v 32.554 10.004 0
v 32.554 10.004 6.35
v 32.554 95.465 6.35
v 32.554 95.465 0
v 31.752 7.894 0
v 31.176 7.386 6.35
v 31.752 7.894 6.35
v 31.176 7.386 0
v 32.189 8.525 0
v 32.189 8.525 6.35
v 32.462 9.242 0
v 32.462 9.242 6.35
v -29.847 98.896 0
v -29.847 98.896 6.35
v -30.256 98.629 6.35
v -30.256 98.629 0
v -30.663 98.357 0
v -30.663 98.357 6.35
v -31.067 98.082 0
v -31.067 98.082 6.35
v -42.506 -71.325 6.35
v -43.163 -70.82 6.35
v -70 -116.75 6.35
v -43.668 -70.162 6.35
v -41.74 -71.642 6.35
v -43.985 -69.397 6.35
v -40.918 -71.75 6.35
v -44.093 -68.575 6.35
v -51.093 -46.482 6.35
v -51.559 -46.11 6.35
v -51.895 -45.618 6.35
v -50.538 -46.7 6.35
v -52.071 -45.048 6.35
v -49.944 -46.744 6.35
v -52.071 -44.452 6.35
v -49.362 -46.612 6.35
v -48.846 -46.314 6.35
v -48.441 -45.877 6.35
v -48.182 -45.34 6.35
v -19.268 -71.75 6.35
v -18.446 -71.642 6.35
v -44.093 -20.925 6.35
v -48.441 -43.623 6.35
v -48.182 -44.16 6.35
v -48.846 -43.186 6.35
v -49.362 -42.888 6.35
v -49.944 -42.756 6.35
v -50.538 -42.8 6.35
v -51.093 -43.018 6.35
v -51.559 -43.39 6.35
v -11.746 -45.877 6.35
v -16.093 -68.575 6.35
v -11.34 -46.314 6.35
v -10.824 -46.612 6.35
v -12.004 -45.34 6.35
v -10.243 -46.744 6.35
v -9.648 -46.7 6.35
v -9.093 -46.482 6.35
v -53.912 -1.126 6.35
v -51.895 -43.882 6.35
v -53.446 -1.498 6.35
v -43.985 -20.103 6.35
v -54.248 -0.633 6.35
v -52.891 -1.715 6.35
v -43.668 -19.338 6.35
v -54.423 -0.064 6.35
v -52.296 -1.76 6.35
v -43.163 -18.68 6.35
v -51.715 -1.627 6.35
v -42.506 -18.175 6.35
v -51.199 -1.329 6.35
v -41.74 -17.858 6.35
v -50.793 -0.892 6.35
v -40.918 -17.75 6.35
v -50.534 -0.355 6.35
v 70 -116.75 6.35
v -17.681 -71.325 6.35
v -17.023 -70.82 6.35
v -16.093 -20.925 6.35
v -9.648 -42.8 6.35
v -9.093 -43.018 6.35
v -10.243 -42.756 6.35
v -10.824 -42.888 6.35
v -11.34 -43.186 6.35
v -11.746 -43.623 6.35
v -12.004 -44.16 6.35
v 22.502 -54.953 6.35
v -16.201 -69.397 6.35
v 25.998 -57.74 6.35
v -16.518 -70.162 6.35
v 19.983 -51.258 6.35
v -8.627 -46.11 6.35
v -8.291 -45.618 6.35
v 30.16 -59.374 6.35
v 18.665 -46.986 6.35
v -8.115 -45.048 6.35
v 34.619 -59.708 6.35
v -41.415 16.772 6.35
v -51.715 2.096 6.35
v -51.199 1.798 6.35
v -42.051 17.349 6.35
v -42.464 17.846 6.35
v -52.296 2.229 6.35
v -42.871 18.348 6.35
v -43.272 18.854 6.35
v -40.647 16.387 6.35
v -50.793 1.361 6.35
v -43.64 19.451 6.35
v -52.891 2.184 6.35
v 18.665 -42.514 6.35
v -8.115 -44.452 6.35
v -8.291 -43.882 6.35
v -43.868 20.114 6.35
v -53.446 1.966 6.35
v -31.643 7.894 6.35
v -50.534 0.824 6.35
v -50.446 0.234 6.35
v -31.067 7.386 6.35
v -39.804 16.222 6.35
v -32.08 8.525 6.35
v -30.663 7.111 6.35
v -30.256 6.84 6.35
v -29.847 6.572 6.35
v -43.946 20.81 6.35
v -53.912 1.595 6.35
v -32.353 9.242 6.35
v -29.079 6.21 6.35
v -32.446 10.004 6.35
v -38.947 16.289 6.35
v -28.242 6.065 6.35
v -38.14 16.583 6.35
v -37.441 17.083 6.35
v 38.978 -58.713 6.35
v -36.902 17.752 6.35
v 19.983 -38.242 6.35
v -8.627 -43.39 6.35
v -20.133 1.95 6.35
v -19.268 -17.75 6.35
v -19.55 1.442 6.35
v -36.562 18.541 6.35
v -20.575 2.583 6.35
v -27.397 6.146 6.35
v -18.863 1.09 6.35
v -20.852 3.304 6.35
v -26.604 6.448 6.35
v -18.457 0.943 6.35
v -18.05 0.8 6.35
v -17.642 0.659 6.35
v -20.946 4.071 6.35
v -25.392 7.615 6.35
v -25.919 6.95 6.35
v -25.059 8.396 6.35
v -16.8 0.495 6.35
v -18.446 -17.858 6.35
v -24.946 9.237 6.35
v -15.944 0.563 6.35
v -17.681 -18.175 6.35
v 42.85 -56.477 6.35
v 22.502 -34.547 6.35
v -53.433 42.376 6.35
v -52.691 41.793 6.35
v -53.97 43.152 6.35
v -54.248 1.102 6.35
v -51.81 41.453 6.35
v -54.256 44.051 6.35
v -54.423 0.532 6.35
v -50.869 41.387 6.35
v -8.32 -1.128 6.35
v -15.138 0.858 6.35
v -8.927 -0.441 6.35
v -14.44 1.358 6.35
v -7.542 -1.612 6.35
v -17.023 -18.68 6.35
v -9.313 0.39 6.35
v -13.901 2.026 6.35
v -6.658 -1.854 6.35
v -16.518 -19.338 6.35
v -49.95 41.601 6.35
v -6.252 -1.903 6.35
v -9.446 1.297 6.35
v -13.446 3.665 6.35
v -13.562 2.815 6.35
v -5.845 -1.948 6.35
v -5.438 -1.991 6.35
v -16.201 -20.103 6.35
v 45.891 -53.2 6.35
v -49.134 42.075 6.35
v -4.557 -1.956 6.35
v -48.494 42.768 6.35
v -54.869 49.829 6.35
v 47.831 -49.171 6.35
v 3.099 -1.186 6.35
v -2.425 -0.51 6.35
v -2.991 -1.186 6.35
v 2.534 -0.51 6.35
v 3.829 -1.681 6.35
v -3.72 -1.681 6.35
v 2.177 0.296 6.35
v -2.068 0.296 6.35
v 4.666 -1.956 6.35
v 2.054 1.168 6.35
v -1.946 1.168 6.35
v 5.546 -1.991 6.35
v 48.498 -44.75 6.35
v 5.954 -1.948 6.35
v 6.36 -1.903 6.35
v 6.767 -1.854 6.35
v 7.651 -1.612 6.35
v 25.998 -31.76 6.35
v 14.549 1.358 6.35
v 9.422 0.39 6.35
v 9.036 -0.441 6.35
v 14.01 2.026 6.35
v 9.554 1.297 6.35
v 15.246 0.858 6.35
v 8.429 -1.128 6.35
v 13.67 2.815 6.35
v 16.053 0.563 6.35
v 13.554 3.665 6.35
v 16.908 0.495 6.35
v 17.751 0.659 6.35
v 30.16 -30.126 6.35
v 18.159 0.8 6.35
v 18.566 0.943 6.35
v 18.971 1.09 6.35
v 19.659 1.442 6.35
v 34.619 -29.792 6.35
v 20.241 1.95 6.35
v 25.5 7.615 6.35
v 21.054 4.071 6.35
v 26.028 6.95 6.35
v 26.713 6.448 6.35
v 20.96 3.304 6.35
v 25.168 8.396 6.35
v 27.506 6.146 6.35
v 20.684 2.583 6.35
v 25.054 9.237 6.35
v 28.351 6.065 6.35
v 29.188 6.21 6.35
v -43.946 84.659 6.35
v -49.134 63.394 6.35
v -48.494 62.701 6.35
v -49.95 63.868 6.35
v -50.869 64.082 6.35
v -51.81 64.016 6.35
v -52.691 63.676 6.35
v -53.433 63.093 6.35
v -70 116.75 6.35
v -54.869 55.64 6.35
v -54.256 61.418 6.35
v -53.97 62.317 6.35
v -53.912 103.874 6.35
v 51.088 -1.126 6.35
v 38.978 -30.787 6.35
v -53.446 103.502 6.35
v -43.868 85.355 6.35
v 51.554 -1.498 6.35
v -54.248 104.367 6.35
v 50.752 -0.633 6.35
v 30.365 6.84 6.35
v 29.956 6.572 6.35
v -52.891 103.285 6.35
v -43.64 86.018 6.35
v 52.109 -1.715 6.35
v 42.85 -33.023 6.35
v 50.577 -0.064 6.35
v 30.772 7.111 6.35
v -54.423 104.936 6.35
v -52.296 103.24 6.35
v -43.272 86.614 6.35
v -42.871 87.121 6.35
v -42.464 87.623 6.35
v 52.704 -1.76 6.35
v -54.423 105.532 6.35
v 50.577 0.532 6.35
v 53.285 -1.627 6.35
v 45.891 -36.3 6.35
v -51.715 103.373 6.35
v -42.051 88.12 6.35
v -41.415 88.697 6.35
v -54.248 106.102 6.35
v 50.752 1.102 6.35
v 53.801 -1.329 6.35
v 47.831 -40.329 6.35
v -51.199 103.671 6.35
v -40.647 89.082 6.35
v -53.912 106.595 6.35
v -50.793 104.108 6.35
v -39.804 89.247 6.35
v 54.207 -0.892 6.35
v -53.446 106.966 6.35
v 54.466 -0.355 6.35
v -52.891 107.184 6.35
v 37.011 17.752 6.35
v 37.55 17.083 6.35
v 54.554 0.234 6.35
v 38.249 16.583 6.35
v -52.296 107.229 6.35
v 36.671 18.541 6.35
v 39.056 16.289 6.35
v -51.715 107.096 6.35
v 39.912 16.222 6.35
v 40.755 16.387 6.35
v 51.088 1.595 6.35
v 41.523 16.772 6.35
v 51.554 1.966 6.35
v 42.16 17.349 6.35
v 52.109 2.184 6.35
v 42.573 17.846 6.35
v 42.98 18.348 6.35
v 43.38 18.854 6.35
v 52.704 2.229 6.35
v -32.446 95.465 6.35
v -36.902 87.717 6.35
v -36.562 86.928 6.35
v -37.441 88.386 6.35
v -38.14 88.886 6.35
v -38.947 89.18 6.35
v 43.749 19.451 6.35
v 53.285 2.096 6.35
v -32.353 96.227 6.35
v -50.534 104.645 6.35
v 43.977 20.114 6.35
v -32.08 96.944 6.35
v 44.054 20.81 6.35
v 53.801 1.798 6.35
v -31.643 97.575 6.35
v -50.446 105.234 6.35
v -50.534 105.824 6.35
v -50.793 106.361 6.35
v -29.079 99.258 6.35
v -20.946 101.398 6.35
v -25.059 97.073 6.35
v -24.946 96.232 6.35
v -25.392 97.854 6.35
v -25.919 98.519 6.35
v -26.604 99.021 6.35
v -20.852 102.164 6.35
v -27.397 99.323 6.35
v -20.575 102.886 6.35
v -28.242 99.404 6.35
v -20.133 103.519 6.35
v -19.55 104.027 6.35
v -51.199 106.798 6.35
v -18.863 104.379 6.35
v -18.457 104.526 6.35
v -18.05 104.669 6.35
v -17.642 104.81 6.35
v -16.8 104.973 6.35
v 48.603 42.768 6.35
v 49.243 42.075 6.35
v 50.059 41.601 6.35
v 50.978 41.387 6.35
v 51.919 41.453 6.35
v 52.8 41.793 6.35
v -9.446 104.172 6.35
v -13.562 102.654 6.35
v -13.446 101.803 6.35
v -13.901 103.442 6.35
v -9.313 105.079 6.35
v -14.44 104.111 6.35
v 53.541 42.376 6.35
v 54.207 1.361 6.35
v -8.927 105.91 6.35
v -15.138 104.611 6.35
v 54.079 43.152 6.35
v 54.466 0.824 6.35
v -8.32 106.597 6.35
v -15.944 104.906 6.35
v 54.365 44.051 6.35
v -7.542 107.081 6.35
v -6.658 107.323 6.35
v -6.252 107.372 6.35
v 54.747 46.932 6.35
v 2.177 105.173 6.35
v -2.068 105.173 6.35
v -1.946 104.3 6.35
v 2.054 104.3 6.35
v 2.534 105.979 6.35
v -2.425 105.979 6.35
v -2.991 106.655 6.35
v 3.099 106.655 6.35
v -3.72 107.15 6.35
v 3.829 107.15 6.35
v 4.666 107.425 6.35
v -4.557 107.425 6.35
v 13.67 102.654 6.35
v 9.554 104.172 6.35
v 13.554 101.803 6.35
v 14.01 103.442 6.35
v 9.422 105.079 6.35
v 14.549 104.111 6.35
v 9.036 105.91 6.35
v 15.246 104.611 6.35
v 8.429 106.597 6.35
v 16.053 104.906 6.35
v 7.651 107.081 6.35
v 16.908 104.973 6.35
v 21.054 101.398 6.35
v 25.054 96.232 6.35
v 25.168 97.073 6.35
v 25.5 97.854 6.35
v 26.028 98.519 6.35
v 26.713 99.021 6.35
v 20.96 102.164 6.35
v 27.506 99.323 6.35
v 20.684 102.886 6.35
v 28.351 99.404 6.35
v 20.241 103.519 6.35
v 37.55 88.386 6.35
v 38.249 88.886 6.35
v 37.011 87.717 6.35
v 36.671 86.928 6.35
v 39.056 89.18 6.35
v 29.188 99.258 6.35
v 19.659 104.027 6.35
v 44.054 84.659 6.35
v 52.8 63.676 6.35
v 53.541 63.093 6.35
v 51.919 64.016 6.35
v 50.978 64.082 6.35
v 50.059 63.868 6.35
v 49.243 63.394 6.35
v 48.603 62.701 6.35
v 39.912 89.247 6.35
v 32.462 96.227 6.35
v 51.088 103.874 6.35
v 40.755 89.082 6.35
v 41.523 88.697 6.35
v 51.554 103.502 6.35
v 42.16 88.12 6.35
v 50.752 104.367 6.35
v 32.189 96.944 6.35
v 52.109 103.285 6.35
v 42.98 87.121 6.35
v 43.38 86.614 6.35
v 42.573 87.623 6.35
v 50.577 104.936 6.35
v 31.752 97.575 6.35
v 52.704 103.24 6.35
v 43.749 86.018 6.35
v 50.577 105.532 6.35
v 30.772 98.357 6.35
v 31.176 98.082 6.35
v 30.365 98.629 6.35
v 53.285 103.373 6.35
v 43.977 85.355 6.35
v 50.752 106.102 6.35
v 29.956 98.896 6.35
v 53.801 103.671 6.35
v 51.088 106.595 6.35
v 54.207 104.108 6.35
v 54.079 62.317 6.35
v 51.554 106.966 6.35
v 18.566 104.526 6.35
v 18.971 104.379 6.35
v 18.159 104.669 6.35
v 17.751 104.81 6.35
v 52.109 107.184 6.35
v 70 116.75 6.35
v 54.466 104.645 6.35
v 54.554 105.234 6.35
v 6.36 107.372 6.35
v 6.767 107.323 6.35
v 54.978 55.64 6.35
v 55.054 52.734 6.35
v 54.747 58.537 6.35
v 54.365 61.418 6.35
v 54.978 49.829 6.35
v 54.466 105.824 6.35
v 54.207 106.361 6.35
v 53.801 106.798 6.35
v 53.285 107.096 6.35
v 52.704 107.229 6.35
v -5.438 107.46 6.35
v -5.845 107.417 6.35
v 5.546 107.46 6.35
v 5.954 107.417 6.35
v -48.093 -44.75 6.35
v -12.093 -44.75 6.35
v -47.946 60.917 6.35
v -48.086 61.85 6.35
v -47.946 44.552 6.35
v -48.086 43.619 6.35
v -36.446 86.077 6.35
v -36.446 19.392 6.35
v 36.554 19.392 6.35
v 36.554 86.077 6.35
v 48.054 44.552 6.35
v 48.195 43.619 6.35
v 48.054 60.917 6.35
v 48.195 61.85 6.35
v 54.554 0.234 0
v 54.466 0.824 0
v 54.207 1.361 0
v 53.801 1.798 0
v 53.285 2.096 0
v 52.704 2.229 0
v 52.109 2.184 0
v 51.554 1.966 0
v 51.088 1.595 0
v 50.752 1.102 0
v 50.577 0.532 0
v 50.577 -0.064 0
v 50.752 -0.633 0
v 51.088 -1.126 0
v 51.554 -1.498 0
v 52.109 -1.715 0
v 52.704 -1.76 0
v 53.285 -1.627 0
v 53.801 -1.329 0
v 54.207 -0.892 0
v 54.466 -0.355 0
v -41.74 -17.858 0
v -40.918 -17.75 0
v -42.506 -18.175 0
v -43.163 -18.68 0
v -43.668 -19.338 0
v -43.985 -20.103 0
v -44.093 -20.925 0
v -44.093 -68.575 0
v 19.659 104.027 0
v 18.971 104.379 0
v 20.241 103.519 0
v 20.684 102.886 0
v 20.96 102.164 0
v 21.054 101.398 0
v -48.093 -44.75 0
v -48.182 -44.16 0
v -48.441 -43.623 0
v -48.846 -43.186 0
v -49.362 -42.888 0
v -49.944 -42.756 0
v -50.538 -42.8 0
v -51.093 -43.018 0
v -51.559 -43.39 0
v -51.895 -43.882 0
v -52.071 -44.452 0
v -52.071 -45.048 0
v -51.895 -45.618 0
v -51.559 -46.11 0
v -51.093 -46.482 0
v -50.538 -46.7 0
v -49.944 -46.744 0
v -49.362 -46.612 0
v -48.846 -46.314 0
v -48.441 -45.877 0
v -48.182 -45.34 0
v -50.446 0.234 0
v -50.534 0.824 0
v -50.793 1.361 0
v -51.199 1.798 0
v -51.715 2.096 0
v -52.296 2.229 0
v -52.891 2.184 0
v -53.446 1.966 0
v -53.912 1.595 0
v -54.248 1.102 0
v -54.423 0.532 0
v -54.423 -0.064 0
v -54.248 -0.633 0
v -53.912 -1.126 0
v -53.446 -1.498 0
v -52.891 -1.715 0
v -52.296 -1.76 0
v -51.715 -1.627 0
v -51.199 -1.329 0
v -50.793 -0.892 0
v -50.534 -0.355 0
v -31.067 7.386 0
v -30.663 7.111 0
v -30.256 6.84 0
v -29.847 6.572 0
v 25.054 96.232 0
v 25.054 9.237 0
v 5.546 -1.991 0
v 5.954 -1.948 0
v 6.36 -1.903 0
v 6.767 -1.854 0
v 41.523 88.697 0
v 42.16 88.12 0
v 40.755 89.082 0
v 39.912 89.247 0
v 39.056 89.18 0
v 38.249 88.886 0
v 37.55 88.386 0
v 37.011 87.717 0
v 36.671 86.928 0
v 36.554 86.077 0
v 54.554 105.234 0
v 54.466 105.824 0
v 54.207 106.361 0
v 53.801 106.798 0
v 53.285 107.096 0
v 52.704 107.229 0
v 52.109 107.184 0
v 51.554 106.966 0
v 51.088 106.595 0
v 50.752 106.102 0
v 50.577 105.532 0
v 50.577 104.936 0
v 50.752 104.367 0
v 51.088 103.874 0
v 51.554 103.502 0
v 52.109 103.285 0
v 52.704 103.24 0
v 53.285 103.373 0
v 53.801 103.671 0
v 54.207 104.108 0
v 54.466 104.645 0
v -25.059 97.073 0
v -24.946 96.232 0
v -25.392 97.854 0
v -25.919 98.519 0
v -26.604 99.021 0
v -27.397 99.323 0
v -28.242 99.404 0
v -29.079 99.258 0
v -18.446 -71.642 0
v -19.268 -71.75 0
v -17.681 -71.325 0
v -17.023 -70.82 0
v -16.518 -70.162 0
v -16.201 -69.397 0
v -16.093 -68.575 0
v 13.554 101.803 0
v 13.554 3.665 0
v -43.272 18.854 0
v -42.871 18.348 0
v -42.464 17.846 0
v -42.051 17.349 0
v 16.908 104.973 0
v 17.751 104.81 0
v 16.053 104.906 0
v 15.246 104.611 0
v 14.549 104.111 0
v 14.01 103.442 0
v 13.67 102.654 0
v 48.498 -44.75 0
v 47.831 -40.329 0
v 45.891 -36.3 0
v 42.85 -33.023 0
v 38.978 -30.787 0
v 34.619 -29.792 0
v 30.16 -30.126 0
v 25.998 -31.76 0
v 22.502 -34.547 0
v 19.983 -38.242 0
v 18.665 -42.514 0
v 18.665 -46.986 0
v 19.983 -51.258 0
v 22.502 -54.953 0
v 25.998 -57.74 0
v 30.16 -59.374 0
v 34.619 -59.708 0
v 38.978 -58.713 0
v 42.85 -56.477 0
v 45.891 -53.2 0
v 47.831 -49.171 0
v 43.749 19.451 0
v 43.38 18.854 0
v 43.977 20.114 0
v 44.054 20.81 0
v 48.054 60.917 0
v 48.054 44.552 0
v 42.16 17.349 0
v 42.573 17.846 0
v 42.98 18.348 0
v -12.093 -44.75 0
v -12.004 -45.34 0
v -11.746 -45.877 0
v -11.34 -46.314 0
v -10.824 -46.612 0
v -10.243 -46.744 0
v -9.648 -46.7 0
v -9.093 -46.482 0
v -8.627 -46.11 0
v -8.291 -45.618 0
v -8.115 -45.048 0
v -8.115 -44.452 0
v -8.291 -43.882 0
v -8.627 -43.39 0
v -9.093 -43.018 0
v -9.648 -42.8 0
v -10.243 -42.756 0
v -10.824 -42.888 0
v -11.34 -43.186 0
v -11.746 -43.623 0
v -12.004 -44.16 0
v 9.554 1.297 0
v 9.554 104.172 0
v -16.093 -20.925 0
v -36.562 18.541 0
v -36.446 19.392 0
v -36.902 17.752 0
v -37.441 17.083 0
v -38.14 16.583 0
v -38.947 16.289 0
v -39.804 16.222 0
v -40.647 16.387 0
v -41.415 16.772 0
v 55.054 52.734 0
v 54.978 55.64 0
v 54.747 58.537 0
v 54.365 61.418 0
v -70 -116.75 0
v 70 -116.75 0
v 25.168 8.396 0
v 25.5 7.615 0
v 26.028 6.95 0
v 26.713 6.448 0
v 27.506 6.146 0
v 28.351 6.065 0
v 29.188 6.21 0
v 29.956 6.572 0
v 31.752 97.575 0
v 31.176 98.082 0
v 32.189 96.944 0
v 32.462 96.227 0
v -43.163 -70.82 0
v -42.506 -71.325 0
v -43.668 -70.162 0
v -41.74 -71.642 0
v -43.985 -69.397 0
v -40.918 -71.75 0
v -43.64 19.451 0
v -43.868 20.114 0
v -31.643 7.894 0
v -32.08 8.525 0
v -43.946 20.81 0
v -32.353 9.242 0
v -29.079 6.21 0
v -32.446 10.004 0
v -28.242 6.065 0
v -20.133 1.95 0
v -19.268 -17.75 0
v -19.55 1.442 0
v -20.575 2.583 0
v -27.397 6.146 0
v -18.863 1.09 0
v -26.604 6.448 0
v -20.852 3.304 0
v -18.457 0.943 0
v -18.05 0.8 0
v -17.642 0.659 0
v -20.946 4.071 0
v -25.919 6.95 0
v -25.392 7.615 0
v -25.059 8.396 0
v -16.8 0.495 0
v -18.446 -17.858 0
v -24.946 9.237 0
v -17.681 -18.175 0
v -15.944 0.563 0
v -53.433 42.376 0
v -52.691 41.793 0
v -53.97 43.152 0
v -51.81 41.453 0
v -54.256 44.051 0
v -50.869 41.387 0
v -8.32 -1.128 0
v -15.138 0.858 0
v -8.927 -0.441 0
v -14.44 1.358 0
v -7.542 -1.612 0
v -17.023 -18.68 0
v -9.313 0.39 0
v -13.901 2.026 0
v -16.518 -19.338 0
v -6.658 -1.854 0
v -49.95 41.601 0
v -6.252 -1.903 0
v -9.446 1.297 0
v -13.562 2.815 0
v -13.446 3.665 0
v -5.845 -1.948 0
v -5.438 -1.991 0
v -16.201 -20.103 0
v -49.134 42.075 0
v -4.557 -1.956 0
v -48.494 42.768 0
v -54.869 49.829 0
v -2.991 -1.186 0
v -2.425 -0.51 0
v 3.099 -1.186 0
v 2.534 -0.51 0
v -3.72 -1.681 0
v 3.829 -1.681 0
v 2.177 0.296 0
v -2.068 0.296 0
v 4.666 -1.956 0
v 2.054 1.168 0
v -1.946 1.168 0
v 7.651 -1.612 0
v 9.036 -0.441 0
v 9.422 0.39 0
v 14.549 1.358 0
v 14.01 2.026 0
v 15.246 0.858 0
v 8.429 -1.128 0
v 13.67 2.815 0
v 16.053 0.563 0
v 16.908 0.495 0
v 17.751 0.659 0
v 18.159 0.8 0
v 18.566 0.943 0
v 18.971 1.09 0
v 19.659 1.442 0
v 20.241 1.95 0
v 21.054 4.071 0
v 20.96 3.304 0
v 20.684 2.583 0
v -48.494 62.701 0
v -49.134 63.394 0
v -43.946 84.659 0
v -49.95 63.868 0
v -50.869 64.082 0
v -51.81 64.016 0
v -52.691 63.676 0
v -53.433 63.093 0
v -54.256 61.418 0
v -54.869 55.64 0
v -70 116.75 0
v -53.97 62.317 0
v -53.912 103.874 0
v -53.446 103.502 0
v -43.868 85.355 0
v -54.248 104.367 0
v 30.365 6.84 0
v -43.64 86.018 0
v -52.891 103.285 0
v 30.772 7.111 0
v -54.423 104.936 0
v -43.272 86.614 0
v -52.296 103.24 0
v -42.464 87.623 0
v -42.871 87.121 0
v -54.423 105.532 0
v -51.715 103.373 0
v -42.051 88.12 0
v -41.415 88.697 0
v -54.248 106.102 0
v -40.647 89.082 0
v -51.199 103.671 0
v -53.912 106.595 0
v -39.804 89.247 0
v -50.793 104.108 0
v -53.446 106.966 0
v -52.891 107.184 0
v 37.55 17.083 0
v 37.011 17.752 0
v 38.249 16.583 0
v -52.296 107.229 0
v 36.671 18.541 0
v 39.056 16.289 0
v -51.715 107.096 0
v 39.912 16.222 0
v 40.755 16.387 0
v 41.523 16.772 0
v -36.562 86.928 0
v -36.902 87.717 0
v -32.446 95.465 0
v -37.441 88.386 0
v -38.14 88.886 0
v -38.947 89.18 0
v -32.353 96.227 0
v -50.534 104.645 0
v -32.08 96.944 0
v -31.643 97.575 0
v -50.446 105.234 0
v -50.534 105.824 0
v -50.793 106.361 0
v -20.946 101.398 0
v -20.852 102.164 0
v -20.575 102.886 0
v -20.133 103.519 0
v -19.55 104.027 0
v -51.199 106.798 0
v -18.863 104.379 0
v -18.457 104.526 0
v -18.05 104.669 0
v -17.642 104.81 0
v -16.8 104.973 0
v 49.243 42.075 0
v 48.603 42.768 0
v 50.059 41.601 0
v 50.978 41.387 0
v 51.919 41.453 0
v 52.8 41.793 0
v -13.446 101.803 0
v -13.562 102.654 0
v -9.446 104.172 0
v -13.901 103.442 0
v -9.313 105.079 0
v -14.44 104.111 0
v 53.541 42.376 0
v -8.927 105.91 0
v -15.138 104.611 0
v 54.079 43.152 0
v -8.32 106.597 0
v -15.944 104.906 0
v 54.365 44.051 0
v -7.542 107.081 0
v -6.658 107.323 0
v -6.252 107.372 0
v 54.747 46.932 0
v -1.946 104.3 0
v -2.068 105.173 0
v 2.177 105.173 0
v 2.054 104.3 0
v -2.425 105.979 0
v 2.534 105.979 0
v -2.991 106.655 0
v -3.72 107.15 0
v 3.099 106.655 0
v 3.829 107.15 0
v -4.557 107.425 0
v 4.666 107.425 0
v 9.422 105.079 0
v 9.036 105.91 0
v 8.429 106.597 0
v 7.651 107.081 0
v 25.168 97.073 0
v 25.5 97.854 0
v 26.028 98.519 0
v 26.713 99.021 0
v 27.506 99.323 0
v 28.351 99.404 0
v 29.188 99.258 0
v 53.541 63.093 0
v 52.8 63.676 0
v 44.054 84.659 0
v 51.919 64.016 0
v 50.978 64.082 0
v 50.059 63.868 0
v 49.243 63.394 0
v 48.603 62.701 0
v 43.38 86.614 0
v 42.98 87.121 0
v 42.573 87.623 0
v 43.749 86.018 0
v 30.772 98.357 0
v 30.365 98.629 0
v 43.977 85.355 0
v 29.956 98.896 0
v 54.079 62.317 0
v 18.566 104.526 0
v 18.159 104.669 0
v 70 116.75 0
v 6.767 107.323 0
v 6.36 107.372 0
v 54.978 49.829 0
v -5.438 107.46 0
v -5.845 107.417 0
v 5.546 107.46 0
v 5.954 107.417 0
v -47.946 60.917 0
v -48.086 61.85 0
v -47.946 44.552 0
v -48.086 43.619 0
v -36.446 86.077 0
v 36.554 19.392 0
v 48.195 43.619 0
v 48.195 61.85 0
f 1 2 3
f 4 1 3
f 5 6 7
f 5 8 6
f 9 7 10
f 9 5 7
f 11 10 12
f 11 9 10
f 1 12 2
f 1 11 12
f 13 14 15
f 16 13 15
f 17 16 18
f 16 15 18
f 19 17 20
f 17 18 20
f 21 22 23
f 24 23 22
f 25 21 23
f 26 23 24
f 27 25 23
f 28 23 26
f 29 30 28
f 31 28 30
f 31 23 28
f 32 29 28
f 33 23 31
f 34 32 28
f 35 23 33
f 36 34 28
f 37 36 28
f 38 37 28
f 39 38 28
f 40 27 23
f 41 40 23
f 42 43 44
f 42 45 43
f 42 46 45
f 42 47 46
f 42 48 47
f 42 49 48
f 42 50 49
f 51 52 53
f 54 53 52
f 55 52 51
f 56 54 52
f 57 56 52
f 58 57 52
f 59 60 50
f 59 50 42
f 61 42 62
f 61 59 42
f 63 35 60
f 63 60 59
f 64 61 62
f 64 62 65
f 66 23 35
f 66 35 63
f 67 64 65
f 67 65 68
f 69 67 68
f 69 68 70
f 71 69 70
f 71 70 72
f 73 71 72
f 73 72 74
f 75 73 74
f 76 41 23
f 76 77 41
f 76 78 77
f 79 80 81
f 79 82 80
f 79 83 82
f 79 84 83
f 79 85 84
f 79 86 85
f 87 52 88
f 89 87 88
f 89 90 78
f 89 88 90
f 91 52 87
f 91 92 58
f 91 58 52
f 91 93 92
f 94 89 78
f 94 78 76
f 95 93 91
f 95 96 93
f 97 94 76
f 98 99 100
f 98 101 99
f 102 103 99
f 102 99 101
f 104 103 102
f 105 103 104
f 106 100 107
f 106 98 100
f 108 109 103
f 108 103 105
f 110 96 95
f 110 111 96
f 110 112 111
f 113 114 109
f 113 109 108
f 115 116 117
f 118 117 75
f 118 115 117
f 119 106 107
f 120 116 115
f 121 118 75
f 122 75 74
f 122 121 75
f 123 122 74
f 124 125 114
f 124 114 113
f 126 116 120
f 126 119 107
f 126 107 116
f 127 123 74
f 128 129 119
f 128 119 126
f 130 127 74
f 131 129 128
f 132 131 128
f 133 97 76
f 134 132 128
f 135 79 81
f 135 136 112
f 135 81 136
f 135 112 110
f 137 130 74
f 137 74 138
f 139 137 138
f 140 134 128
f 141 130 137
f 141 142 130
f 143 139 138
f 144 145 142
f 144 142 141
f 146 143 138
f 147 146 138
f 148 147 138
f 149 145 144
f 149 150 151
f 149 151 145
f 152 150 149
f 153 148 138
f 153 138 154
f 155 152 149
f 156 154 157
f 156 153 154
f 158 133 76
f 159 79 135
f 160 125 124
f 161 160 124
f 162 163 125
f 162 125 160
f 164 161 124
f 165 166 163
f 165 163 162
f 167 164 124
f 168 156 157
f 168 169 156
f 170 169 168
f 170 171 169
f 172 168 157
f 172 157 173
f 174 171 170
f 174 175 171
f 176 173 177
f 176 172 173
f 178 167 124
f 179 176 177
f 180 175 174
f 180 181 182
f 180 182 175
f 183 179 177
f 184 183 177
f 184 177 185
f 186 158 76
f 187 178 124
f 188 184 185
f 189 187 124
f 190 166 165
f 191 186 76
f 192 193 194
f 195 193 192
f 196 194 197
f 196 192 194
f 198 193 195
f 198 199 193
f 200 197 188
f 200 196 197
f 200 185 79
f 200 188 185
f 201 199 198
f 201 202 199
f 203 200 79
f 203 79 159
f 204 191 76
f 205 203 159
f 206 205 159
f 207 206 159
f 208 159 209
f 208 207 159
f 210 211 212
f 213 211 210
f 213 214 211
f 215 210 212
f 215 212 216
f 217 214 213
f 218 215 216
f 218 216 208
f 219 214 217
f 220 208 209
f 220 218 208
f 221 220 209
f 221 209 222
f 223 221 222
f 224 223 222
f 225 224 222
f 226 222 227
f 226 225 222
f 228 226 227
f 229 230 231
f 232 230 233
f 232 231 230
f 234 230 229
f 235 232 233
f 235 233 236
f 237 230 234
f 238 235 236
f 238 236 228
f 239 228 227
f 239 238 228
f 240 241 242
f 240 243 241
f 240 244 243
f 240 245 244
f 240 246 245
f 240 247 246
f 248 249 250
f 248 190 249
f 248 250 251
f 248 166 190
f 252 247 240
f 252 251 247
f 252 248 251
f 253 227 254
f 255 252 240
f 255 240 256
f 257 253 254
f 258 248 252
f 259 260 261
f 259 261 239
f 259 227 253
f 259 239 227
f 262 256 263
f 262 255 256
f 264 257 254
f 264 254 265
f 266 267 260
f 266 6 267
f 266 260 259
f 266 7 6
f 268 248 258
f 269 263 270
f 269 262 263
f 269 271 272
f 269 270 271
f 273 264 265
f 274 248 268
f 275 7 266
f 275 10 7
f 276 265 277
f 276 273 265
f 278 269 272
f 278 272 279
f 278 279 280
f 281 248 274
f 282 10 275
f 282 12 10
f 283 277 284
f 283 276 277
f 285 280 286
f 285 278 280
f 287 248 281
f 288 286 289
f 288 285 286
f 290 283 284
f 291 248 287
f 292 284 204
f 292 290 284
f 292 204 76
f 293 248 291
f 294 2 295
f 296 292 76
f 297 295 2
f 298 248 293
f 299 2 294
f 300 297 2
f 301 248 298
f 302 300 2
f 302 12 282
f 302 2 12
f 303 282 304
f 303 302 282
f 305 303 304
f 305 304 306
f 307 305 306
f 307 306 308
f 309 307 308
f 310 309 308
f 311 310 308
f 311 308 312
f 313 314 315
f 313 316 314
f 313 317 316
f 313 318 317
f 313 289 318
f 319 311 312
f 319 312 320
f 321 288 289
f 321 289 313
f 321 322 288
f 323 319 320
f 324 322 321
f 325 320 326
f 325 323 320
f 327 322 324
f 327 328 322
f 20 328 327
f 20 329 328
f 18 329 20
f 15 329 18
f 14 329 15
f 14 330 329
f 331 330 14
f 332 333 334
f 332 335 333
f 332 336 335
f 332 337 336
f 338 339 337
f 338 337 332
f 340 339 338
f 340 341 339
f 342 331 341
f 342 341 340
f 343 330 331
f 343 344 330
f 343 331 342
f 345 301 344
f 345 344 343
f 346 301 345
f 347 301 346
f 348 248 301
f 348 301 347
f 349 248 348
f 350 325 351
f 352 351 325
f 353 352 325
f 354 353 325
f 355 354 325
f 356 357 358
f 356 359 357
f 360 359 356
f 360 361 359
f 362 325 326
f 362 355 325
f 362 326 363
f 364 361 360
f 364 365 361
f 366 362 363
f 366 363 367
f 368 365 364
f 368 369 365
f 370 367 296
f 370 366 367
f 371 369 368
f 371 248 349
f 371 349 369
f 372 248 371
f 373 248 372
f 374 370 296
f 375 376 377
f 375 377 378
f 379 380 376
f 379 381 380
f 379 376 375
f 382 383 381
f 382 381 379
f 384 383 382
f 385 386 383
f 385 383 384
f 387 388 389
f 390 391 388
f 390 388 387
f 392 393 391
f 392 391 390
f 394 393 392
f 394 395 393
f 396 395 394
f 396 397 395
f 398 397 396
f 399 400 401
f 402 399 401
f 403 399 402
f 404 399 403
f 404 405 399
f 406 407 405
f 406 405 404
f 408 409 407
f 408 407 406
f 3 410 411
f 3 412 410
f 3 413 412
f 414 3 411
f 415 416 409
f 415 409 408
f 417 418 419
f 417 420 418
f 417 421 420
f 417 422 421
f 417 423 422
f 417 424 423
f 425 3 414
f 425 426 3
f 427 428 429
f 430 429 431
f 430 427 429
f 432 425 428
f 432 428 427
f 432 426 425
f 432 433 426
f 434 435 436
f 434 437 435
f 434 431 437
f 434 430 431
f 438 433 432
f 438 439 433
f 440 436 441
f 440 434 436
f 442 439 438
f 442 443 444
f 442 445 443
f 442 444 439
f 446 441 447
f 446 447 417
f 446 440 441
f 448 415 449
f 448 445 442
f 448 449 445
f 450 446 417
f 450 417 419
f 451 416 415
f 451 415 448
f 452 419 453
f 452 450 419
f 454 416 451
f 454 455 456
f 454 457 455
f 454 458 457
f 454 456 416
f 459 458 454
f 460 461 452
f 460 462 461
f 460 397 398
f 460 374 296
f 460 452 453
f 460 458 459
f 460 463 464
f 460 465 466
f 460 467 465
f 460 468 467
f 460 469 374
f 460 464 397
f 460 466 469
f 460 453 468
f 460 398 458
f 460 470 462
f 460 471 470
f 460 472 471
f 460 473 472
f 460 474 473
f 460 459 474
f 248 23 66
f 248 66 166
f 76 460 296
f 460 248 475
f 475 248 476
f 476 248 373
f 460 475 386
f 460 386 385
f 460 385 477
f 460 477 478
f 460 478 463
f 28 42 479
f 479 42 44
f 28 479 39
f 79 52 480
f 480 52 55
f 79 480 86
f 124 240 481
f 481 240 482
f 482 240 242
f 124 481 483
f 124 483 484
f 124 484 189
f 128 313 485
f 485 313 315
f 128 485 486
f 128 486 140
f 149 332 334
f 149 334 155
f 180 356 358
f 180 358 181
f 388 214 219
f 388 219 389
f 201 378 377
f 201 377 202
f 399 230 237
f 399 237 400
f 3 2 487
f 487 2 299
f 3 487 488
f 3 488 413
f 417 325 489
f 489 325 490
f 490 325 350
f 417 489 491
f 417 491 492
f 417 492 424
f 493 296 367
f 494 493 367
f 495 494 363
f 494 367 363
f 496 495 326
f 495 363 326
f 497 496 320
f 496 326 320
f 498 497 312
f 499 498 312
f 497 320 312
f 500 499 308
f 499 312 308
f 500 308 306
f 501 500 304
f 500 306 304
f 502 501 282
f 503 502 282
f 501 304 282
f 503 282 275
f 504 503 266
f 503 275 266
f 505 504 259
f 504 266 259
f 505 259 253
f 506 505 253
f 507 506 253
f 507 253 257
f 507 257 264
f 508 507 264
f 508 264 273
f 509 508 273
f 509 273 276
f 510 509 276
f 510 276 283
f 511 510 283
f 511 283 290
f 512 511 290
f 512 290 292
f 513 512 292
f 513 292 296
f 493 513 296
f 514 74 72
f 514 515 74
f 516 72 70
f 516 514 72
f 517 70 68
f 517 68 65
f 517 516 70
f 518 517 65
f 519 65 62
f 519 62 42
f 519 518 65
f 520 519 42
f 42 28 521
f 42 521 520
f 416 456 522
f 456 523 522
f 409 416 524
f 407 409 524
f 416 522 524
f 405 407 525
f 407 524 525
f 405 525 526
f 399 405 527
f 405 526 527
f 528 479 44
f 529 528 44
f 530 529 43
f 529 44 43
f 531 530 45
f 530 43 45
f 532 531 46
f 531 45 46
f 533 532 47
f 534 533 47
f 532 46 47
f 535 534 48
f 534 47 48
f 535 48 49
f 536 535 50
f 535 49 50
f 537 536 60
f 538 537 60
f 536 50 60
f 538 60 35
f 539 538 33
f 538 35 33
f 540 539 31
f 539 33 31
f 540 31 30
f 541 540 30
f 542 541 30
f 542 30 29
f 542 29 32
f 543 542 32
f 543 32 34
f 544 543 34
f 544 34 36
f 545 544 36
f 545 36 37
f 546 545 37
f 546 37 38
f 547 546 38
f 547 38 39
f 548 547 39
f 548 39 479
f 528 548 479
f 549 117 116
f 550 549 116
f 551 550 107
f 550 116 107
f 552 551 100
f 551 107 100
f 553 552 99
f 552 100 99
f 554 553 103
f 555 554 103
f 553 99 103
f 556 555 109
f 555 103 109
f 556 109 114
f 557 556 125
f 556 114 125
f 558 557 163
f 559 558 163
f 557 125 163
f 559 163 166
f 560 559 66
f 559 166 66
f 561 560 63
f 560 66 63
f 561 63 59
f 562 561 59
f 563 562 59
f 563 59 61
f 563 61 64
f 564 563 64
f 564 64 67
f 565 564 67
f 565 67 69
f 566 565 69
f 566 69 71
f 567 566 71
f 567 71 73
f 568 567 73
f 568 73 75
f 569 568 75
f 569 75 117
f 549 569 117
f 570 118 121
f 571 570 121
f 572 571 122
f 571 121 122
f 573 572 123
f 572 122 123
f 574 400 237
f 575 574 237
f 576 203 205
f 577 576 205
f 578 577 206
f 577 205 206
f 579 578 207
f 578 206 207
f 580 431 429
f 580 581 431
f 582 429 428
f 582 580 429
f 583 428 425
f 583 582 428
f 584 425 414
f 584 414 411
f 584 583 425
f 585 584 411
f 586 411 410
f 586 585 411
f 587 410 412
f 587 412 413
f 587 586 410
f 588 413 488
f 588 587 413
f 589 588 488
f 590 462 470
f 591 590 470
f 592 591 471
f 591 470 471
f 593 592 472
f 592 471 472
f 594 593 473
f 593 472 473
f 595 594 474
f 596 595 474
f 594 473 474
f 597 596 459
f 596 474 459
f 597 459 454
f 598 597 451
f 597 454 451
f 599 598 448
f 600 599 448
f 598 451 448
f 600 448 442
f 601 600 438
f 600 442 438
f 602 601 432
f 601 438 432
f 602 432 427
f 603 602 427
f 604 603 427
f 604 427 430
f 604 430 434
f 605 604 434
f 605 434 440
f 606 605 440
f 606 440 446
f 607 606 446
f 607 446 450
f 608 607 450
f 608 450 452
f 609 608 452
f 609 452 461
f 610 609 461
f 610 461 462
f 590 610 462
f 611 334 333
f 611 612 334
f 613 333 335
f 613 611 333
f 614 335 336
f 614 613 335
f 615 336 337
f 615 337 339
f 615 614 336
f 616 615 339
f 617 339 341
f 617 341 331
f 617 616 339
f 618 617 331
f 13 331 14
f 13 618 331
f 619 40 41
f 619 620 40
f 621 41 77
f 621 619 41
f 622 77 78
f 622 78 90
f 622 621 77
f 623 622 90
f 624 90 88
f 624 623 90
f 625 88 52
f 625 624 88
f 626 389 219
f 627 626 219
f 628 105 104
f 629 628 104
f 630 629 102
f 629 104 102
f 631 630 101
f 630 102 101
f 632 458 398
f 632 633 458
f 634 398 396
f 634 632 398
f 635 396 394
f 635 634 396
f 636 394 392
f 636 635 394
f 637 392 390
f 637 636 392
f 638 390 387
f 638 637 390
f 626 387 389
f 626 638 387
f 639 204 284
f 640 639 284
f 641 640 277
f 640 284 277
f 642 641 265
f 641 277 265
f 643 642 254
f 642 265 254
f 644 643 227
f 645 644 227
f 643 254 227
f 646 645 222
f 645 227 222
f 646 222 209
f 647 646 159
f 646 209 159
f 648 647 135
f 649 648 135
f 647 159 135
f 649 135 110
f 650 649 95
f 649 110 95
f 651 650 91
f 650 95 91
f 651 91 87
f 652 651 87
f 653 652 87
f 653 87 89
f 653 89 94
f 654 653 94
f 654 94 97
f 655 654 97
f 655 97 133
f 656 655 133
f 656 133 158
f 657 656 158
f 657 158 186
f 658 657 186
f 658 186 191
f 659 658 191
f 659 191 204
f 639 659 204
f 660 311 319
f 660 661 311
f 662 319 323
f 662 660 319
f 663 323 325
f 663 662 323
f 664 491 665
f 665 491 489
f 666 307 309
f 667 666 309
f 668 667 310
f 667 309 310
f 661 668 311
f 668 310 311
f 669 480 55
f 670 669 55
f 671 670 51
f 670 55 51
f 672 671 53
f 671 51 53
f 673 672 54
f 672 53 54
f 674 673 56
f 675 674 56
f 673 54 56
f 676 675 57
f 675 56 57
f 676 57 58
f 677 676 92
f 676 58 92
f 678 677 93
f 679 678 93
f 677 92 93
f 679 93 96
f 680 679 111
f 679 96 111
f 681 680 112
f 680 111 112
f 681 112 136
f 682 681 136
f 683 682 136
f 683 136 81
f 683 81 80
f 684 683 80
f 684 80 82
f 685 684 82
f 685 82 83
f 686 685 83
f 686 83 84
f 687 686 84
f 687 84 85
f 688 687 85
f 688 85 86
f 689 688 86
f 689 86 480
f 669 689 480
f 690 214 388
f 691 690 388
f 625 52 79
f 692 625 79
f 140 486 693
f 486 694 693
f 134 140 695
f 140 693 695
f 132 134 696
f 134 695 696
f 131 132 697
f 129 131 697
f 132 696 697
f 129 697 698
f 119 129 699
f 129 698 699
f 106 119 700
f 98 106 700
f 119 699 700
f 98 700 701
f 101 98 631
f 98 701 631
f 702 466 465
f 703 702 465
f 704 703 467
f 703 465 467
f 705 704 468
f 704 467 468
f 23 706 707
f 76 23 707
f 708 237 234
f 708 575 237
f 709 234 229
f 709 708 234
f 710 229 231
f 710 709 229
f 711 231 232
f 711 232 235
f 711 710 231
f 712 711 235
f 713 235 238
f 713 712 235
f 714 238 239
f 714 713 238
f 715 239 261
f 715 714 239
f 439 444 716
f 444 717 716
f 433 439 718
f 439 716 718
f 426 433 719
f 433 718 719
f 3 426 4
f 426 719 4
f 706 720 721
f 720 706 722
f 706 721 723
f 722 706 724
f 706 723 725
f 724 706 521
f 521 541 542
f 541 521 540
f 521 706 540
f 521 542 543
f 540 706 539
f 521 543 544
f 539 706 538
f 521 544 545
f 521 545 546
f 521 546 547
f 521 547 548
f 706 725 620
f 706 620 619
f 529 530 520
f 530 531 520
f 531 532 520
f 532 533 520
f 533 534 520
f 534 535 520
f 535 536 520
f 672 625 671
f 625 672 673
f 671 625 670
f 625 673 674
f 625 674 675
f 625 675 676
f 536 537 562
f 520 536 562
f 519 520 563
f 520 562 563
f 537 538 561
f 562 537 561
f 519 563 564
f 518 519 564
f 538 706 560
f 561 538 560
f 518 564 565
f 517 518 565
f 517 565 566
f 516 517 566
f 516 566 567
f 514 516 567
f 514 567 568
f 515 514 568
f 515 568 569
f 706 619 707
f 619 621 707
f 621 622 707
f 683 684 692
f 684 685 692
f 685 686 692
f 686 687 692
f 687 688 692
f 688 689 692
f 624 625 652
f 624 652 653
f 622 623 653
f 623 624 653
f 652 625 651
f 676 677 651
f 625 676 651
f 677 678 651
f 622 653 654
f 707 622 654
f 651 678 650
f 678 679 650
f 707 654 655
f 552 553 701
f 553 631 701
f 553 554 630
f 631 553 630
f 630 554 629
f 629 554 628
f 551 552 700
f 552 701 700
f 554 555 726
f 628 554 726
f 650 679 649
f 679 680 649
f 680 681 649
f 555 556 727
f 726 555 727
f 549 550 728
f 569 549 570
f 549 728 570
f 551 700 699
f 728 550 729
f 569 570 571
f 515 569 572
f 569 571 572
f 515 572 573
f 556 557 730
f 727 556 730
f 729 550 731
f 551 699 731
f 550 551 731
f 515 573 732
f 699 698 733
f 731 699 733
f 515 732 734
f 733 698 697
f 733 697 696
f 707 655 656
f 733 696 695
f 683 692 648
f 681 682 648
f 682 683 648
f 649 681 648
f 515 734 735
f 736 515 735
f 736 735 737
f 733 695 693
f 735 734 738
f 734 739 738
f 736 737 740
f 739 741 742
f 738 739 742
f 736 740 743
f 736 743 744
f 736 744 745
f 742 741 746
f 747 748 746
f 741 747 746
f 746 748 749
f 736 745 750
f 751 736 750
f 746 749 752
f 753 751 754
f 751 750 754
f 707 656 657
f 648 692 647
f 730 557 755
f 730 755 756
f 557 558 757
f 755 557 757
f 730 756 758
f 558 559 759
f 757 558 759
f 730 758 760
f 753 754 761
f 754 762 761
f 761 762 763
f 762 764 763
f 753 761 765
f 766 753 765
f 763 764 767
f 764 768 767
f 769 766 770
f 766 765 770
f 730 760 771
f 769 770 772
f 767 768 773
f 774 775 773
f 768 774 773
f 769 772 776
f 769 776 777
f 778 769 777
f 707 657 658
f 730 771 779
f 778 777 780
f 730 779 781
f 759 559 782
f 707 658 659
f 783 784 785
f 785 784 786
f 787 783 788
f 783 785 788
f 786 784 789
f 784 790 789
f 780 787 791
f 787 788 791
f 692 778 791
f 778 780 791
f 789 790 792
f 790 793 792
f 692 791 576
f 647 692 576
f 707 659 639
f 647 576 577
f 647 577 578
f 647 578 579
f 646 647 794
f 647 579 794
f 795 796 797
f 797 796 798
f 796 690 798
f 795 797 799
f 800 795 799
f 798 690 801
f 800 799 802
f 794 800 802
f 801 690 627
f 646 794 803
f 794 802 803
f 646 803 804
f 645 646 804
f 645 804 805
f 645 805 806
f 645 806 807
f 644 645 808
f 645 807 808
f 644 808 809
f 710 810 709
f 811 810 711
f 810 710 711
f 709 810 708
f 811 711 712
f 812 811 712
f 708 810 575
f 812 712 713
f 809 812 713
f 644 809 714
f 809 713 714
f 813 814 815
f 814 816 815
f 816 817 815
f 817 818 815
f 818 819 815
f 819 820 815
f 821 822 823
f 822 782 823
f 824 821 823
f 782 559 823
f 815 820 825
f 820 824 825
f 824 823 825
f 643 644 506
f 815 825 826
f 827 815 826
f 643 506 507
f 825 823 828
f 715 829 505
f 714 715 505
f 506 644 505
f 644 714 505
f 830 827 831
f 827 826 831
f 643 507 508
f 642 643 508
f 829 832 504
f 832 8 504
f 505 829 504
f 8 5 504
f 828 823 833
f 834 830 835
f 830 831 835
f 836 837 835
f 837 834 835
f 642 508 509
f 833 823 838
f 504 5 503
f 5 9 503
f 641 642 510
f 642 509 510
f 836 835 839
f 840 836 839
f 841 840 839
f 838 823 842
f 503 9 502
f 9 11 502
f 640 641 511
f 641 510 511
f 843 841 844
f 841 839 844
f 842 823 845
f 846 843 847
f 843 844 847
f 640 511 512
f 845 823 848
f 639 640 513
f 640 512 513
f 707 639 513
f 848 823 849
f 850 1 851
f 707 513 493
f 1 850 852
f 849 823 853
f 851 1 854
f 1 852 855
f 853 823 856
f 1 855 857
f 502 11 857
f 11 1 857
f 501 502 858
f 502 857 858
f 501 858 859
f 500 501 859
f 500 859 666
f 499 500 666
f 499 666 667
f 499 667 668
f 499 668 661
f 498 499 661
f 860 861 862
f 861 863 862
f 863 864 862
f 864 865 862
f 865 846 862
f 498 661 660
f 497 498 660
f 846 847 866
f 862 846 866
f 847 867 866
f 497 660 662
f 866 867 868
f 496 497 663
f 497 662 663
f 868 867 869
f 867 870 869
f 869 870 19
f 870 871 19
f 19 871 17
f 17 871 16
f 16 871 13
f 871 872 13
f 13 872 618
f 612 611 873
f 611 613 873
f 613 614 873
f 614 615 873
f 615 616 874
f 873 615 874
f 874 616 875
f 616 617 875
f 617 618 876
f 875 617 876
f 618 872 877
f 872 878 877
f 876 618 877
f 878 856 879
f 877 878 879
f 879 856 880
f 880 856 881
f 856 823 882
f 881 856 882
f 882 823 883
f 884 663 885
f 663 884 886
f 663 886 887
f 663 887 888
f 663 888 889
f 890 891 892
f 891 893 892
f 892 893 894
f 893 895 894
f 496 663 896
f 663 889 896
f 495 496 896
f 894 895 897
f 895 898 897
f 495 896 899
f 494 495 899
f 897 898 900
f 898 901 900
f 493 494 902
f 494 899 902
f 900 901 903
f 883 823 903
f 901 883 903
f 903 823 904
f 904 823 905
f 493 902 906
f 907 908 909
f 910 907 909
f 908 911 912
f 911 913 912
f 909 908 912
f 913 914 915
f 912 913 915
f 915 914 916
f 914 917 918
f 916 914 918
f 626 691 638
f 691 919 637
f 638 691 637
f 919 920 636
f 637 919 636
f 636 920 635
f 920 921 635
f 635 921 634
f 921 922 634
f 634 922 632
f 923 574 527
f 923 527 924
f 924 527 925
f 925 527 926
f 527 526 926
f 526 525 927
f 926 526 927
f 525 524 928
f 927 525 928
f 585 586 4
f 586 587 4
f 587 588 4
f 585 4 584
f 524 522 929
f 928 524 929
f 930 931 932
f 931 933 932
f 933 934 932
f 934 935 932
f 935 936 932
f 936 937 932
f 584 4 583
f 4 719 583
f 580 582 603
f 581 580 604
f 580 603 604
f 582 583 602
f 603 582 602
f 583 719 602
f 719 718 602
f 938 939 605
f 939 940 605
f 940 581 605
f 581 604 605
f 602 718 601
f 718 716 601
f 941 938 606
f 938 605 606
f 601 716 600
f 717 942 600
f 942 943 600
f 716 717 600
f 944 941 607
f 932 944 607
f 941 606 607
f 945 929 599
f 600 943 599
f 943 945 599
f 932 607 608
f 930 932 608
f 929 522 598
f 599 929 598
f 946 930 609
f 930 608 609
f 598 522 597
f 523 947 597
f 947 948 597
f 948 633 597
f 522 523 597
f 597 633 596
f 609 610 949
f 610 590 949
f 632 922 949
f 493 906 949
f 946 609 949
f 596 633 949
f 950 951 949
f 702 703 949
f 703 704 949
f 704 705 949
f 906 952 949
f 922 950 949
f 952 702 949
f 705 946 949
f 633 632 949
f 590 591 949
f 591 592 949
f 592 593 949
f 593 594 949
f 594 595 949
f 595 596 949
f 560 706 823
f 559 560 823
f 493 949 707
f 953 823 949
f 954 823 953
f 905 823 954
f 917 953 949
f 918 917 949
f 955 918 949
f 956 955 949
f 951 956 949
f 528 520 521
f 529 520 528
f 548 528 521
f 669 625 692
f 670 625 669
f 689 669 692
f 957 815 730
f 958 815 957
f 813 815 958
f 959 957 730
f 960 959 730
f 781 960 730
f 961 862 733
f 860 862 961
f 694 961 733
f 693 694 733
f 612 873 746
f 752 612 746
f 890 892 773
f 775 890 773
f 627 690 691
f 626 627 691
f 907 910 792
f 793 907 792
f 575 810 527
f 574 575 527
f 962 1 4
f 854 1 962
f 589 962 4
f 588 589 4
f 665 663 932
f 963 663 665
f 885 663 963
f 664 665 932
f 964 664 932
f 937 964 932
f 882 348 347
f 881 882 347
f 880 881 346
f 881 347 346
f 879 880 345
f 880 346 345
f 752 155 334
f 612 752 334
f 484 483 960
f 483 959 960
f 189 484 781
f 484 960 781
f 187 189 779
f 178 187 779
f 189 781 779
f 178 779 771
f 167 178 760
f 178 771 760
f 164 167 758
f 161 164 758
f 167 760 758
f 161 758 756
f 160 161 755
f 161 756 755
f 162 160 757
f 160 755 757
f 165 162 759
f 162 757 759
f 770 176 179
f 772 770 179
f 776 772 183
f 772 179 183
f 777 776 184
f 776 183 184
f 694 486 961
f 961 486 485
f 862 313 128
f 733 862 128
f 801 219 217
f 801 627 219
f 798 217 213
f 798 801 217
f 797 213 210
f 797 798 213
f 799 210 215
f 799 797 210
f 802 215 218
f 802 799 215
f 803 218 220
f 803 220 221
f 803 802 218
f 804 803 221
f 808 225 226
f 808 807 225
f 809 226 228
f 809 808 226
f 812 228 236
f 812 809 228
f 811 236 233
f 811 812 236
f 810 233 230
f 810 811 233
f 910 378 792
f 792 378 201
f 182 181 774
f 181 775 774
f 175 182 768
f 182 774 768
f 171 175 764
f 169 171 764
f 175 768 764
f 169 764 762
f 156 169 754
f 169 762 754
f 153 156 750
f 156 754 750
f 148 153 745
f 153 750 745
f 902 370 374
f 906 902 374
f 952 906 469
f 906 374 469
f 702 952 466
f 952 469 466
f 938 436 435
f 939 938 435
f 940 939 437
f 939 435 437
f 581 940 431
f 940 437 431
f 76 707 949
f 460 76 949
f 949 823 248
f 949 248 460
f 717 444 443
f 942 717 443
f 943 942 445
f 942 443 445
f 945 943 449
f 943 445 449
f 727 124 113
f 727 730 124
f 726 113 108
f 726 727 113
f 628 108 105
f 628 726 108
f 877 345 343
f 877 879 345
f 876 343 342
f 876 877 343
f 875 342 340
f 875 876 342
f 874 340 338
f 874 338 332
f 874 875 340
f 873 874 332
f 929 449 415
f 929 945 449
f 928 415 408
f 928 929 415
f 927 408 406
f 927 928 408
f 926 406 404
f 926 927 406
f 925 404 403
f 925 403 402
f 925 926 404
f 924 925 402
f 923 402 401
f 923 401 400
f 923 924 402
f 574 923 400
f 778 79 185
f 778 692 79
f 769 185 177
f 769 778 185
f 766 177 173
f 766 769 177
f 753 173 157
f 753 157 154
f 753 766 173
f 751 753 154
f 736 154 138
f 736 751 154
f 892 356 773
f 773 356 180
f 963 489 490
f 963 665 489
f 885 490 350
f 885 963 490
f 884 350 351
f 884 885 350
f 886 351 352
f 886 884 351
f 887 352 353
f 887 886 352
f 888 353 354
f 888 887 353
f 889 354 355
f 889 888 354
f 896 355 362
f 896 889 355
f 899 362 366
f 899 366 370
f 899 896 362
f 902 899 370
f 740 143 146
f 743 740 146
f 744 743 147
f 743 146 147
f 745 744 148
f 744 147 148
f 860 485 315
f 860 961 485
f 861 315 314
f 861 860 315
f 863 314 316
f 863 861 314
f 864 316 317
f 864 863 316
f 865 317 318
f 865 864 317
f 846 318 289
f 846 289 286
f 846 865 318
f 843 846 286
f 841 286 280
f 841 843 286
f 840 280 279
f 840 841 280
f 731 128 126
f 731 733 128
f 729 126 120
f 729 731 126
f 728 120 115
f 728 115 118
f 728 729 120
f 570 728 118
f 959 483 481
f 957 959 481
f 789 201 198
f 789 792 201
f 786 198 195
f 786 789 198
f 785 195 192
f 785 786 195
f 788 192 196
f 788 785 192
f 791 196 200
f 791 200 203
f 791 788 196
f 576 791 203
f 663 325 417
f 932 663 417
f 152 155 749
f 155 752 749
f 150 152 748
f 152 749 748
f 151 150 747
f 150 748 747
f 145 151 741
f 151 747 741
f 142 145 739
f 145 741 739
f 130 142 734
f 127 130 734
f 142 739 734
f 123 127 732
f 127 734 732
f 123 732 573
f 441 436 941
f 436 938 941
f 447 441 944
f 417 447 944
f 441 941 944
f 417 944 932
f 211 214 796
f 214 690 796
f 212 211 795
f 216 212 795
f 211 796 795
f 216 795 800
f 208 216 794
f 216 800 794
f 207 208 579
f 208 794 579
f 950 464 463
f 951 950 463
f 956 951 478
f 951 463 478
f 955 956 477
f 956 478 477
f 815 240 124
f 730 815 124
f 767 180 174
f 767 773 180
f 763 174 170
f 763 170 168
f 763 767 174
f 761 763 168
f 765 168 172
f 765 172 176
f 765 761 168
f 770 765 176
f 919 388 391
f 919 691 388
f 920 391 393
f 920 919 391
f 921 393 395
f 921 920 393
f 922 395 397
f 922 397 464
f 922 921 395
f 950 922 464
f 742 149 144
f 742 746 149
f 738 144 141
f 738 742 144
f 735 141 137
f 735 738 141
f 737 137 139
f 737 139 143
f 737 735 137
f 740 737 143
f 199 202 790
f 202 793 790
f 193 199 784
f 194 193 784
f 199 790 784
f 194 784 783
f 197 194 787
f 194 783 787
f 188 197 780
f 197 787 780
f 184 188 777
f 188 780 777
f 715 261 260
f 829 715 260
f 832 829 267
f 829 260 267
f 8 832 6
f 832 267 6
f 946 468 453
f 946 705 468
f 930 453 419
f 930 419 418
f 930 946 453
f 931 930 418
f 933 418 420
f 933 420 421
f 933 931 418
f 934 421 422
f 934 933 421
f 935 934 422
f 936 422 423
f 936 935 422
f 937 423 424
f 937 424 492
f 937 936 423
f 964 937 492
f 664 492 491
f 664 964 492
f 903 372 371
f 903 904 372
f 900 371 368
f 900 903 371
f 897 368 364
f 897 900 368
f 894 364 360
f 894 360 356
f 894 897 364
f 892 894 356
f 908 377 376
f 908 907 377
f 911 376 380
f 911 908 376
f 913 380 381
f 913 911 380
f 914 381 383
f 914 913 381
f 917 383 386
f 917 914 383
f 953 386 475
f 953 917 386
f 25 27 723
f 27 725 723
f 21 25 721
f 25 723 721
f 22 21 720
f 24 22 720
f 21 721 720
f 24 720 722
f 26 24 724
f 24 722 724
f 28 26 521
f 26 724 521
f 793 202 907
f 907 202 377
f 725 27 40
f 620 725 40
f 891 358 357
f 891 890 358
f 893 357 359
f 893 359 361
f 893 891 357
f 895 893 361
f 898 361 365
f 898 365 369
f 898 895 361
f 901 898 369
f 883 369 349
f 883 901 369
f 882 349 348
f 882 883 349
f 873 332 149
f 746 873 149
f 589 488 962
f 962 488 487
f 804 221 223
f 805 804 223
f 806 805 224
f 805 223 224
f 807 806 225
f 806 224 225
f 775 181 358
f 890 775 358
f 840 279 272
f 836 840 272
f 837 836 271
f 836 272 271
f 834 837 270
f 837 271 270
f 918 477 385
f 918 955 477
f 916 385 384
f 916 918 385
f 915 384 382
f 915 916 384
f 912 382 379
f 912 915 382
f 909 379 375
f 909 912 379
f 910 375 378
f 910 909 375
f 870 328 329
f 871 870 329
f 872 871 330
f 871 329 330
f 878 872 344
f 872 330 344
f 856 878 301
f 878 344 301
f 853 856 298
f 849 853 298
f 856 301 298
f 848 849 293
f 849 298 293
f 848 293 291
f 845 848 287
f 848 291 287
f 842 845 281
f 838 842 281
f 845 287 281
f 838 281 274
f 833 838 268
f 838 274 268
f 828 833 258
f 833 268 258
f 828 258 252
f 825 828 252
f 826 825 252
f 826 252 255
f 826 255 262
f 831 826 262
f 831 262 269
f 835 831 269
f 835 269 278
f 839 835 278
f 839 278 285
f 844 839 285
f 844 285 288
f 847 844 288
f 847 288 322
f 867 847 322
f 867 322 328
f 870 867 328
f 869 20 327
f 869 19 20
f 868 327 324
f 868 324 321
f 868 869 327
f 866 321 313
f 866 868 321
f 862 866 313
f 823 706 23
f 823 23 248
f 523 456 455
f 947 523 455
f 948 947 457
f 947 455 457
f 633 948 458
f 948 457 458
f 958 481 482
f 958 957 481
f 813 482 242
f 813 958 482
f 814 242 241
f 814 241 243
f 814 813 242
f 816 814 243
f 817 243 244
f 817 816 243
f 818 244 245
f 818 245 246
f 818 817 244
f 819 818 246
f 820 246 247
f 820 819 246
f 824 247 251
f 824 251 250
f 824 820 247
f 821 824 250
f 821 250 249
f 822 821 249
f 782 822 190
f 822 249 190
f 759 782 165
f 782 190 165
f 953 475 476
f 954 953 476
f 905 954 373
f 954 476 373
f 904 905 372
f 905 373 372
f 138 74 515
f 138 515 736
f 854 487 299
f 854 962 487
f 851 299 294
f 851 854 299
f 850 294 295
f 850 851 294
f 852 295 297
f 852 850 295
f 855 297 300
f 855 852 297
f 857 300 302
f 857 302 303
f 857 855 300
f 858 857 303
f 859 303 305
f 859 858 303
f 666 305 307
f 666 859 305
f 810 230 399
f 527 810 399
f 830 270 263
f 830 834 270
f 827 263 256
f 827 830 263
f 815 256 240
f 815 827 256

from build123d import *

# Parameters (mm, degrees)
SKETCH1_W           = 140
SKETCH1_H           = 233.5
BOSS_EXTRUDE1_DEPTH = 6.35
SKETCH2_R           = 2
SKETCH2_W           = 28
SKETCH2_H           = 54
CUT_EXTRUDE1_DEPTH  = 137.275034397
FILLET1_R           = 3.175
SKETCH3_R           = 15
CUT_EXTRUDE2_DEPTH  = 137.275034397
SKETCH4_R           = 2
CUT_EXTRUDE3_DEPTH  = 137.275034397
CUT_EXTRUDE4_DEPTH  = 6.35
FILLET2_R           = 3.175


with BuildPart() as part:
    # Sketch1 → Boss-Extrude1 (new body)
    with BuildSketch(Plane.XY):
        Rectangle(SKETCH1_W, SKETCH1_H)
    extrude(amount=BOSS_EXTRUDE1_DEPTH)

    # Sketch2 → Cut-Extrude1 (cut, through all)
    with BuildSketch(Plane.XY.offset(6.35)):
        with Locations((-50.09306053, -44.75)):
            Circle(SKETCH2_R)
        with Locations(Location((-10.09306053, -44.75, 0), (0, 0, 180))):
            Circle(SKETCH2_R)
        with Locations((-30.09306053, -44.75)):
            Rectangle(SKETCH2_W, SKETCH2_H)
    extrude(amount=-CUT_EXTRUDE1_DEPTH, mode=Mode.SUBTRACT)

    # Fillet1
    fillet1_edges = [part.edges().sort_by_distance(p)[0] for p in [
        (-16.09306053, -17.75, 3.175),
        (-16.09306053, -71.75, 3.175),
        (-44.09306053, -71.75, 3.175),
        (-44.09306053, -17.75, 3.175),
    ]]
    fillet(fillet1_edges, radius=FILLET1_R)

    # Sketch3 → Cut-Extrude2 (cut, through all)
    with BuildSketch(Plane.XY.offset(6.35)):
        with Locations((33.497744664, -44.75)):
            Circle(SKETCH3_R)
    extrude(amount=-CUT_EXTRUDE2_DEPTH, mode=Mode.SUBTRACT)

    # Sketch4 → Cut-Extrude3 (cut, through all)
    with BuildSketch(Plane.XY.offset(6.35)):
        with Locations((-52.445599483, 105.234409499)):
            Circle(SKETCH4_R)
        with Locations((52.554400517, 105.234409499)):
            Circle(SKETCH4_R)
        with Locations((52.554400517, 0.234409499)):
            Circle(SKETCH4_R)
        with Locations((-52.445599483, 0.234409499)):
            Circle(SKETCH4_R)
    extrude(amount=-CUT_EXTRUDE3_DEPTH, mode=Mode.SUBTRACT)

    # Sketch5 → Cut-Extrude4 (cut)
    with BuildSketch(Plane.XY.offset(6.35)):
        with BuildLine():
            Line((-47.945599483, 25.882966335), (-47.945599483, 79.585852663))
            ThreePointArc((-47.945599483, 79.585852663), (-54.945599483, 52.734409499), (-47.945599483, 25.882966335))
        make_face()
        with BuildLine():
            Line((-36.445599483, 11.591366345), (-36.445599483, 93.877452653))
            ThreePointArc((-36.445599483, 93.877452653), (-40.401004412, 89.995115505), (-43.945599483, 85.734409499))
            Line((-43.945599483, 85.734409499), (-43.945599483, 19.734409499))
            ThreePointArc((-43.945599483, 19.734409499), (-40.401004412, 15.473703493), (-36.445599483, 11.591366345))
        make_face()
        with BuildLine():
            Line((-24.945599483, 3.744614643), (-24.945599483, 101.724204355))
            ThreePointArc((-24.945599483, 101.724204355), (-28.788219753, 99.56498985), (-32.445599483, 97.105007872))
            Line((-32.445599483, 97.105007872), (-32.445599483, 8.363811126))
            ThreePointArc((-32.445599483, 8.363811126), (-28.788219753, 5.903829149), (-24.945599483, 3.744614643))
        make_face()
        with BuildLine():
            Line((-13.445599483, -0.583036051), (-13.445599483, 106.051855049))
            ThreePointArc((-13.445599483, 106.051855049), (-17.240267527, 104.944508687), (-20.945599483, 103.567469608))
            Line((-20.945599483, 103.567469608), (-20.945599483, 1.90134939))
            ThreePointArc((-20.945599483, 1.90134939), (-17.240267527, 0.524310311), (-13.445599483, -0.583036051))
        make_face()
        with BuildLine():
            Line((-1.945599483, -2.229214836), (-1.945599483, 107.698033834))
            ThreePointArc((-1.945599483, 107.698033834), (-5.709160893, 107.431588219), (-9.445599483, 106.907742422))
            Line((-9.445599483, 106.907742422), (-9.445599483, -1.438923424))
            ThreePointArc((-9.445599483, -1.438923424), (-5.709160893, -1.96276922), (-1.945599483, -2.229214836))
        make_face()
        with BuildLine():
            Line((9.554400517, -1.438923424), (9.554400517, 106.907742422))
            ThreePointArc((9.554400517, 106.907742422), (5.817961927, 107.431588219), (2.054400517, 107.698033834))
            Line((2.054400517, 107.698033834), (2.054400517, -2.229214836))
            ThreePointArc((2.054400517, -2.229214836), (5.817961927, -1.96276922), (9.554400517, -1.438923424))
        make_face()
        with BuildLine():
            ThreePointArc((21.054400517, 103.567469608), (17.349068561, 104.944508687), (13.554400517, 106.051855049))
            Line((13.554400517, 106.051855049), (13.554400517, -0.583036051))
            ThreePointArc((13.554400517, -0.583036051), (17.349068561, 0.524310311), (21.054400517, 1.90134939))
            Line((21.054400517, 1.90134939), (21.054400517, 103.567469608))
        make_face()
        with BuildLine():
            ThreePointArc((32.554400517, 97.105007872), (28.897020787, 99.56498985), (25.054400517, 101.724204355))
            Line((25.054400517, 101.724204355), (25.054400517, 3.744614643))
            ThreePointArc((25.054400517, 3.744614643), (28.897020787, 5.903829149), (32.554400517, 8.363811126))
            Line((32.554400517, 8.363811126), (32.554400517, 97.105007872))
        make_face()
        with BuildLine():
            ThreePointArc((44.054400517, 85.734409499), (40.509805446, 89.995115505), (36.554400517, 93.877452653))
            Line((36.554400517, 93.877452653), (36.554400517, 11.591366345))
            ThreePointArc((36.554400517, 11.591366345), (40.509805446, 15.473703493), (44.054400517, 19.734409499))
            Line((44.054400517, 19.734409499), (44.054400517, 85.734409499))
        make_face()
        with BuildLine():
            ThreePointArc((55.054400517, 52.734409499), (53.27563688, 66.608846425), (48.054400517, 79.585852663))
            Line((48.054400517, 79.585852663), (48.054400517, 25.882966335))
            ThreePointArc((48.054400517, 25.882966335), (53.27563688, 38.859972574), (55.054400517, 52.734409499))
        make_face()
    extrude(amount=-CUT_EXTRUDE4_DEPTH, mode=Mode.SUBTRACT)

    # Fillet2
    fillet2_edges = [part.edges().sort_by_distance(p)[0] for p in [
        (-47.945599483, 79.585852663, 3.175),
        (-47.945599483, 25.882966335, 3.175),
        (-36.445599483, 93.877452653, 3.175),
        (-36.445599483, 11.591366345, 3.175),
        (-43.945599483, 19.734409499, 3.175),
        (-43.945599483, 85.734409499, 3.175),
        (-24.945599483, 101.724204355, 3.175),
        (-24.945599483, 3.744614643, 3.175),
        (-32.445599483, 8.363811126, 3.175),
        (-32.445599483, 97.105007872, 3.175),
        (-13.445599483, 106.051855049, 3.175),
        (-13.445599483, -0.583036051, 3.175),
        (-20.945599483, 1.90134939, 3.175),
        (-20.945599483, 103.567469608, 3.175),
        (-1.945599483, 107.698033834, 3.175),
        (-1.945599483, -2.229214836, 3.175),
        (-9.445599483, -1.438923424, 3.175),
        (-9.445599483, 106.907742422, 3.175),
        (9.554400517, 106.907742422, 3.175),
        (9.554400517, -1.438923424, 3.175),
        (2.054400517, -2.229214836, 3.175),
        (2.054400517, 107.698033834, 3.175),
        (21.054400517, 103.567469608, 3.175),
        (21.054400517, 1.90134939, 3.175),
        (13.554400517, -0.583036051, 3.175),
        (13.554400517, 106.051855049, 3.175),
        (32.554400517, 97.105007872, 3.175),
        (32.554400517, 8.363811126, 3.175),
        (25.054400517, 3.744614643, 3.175),
        (25.054400517, 101.724204355, 3.175),
        (44.054400517, 85.734409499, 3.175),
        (44.054400517, 19.734409499, 3.175),
        (36.554400517, 11.591366345, 3.175),
        (36.554400517, 93.877452653, 3.175),
        (48.054400517, 25.882966335, 3.175),
        (48.054400517, 79.585852663, 3.175),
    ]]
    fillet(fillet2_edges, radius=FILLET2_R)


solid = part.part
